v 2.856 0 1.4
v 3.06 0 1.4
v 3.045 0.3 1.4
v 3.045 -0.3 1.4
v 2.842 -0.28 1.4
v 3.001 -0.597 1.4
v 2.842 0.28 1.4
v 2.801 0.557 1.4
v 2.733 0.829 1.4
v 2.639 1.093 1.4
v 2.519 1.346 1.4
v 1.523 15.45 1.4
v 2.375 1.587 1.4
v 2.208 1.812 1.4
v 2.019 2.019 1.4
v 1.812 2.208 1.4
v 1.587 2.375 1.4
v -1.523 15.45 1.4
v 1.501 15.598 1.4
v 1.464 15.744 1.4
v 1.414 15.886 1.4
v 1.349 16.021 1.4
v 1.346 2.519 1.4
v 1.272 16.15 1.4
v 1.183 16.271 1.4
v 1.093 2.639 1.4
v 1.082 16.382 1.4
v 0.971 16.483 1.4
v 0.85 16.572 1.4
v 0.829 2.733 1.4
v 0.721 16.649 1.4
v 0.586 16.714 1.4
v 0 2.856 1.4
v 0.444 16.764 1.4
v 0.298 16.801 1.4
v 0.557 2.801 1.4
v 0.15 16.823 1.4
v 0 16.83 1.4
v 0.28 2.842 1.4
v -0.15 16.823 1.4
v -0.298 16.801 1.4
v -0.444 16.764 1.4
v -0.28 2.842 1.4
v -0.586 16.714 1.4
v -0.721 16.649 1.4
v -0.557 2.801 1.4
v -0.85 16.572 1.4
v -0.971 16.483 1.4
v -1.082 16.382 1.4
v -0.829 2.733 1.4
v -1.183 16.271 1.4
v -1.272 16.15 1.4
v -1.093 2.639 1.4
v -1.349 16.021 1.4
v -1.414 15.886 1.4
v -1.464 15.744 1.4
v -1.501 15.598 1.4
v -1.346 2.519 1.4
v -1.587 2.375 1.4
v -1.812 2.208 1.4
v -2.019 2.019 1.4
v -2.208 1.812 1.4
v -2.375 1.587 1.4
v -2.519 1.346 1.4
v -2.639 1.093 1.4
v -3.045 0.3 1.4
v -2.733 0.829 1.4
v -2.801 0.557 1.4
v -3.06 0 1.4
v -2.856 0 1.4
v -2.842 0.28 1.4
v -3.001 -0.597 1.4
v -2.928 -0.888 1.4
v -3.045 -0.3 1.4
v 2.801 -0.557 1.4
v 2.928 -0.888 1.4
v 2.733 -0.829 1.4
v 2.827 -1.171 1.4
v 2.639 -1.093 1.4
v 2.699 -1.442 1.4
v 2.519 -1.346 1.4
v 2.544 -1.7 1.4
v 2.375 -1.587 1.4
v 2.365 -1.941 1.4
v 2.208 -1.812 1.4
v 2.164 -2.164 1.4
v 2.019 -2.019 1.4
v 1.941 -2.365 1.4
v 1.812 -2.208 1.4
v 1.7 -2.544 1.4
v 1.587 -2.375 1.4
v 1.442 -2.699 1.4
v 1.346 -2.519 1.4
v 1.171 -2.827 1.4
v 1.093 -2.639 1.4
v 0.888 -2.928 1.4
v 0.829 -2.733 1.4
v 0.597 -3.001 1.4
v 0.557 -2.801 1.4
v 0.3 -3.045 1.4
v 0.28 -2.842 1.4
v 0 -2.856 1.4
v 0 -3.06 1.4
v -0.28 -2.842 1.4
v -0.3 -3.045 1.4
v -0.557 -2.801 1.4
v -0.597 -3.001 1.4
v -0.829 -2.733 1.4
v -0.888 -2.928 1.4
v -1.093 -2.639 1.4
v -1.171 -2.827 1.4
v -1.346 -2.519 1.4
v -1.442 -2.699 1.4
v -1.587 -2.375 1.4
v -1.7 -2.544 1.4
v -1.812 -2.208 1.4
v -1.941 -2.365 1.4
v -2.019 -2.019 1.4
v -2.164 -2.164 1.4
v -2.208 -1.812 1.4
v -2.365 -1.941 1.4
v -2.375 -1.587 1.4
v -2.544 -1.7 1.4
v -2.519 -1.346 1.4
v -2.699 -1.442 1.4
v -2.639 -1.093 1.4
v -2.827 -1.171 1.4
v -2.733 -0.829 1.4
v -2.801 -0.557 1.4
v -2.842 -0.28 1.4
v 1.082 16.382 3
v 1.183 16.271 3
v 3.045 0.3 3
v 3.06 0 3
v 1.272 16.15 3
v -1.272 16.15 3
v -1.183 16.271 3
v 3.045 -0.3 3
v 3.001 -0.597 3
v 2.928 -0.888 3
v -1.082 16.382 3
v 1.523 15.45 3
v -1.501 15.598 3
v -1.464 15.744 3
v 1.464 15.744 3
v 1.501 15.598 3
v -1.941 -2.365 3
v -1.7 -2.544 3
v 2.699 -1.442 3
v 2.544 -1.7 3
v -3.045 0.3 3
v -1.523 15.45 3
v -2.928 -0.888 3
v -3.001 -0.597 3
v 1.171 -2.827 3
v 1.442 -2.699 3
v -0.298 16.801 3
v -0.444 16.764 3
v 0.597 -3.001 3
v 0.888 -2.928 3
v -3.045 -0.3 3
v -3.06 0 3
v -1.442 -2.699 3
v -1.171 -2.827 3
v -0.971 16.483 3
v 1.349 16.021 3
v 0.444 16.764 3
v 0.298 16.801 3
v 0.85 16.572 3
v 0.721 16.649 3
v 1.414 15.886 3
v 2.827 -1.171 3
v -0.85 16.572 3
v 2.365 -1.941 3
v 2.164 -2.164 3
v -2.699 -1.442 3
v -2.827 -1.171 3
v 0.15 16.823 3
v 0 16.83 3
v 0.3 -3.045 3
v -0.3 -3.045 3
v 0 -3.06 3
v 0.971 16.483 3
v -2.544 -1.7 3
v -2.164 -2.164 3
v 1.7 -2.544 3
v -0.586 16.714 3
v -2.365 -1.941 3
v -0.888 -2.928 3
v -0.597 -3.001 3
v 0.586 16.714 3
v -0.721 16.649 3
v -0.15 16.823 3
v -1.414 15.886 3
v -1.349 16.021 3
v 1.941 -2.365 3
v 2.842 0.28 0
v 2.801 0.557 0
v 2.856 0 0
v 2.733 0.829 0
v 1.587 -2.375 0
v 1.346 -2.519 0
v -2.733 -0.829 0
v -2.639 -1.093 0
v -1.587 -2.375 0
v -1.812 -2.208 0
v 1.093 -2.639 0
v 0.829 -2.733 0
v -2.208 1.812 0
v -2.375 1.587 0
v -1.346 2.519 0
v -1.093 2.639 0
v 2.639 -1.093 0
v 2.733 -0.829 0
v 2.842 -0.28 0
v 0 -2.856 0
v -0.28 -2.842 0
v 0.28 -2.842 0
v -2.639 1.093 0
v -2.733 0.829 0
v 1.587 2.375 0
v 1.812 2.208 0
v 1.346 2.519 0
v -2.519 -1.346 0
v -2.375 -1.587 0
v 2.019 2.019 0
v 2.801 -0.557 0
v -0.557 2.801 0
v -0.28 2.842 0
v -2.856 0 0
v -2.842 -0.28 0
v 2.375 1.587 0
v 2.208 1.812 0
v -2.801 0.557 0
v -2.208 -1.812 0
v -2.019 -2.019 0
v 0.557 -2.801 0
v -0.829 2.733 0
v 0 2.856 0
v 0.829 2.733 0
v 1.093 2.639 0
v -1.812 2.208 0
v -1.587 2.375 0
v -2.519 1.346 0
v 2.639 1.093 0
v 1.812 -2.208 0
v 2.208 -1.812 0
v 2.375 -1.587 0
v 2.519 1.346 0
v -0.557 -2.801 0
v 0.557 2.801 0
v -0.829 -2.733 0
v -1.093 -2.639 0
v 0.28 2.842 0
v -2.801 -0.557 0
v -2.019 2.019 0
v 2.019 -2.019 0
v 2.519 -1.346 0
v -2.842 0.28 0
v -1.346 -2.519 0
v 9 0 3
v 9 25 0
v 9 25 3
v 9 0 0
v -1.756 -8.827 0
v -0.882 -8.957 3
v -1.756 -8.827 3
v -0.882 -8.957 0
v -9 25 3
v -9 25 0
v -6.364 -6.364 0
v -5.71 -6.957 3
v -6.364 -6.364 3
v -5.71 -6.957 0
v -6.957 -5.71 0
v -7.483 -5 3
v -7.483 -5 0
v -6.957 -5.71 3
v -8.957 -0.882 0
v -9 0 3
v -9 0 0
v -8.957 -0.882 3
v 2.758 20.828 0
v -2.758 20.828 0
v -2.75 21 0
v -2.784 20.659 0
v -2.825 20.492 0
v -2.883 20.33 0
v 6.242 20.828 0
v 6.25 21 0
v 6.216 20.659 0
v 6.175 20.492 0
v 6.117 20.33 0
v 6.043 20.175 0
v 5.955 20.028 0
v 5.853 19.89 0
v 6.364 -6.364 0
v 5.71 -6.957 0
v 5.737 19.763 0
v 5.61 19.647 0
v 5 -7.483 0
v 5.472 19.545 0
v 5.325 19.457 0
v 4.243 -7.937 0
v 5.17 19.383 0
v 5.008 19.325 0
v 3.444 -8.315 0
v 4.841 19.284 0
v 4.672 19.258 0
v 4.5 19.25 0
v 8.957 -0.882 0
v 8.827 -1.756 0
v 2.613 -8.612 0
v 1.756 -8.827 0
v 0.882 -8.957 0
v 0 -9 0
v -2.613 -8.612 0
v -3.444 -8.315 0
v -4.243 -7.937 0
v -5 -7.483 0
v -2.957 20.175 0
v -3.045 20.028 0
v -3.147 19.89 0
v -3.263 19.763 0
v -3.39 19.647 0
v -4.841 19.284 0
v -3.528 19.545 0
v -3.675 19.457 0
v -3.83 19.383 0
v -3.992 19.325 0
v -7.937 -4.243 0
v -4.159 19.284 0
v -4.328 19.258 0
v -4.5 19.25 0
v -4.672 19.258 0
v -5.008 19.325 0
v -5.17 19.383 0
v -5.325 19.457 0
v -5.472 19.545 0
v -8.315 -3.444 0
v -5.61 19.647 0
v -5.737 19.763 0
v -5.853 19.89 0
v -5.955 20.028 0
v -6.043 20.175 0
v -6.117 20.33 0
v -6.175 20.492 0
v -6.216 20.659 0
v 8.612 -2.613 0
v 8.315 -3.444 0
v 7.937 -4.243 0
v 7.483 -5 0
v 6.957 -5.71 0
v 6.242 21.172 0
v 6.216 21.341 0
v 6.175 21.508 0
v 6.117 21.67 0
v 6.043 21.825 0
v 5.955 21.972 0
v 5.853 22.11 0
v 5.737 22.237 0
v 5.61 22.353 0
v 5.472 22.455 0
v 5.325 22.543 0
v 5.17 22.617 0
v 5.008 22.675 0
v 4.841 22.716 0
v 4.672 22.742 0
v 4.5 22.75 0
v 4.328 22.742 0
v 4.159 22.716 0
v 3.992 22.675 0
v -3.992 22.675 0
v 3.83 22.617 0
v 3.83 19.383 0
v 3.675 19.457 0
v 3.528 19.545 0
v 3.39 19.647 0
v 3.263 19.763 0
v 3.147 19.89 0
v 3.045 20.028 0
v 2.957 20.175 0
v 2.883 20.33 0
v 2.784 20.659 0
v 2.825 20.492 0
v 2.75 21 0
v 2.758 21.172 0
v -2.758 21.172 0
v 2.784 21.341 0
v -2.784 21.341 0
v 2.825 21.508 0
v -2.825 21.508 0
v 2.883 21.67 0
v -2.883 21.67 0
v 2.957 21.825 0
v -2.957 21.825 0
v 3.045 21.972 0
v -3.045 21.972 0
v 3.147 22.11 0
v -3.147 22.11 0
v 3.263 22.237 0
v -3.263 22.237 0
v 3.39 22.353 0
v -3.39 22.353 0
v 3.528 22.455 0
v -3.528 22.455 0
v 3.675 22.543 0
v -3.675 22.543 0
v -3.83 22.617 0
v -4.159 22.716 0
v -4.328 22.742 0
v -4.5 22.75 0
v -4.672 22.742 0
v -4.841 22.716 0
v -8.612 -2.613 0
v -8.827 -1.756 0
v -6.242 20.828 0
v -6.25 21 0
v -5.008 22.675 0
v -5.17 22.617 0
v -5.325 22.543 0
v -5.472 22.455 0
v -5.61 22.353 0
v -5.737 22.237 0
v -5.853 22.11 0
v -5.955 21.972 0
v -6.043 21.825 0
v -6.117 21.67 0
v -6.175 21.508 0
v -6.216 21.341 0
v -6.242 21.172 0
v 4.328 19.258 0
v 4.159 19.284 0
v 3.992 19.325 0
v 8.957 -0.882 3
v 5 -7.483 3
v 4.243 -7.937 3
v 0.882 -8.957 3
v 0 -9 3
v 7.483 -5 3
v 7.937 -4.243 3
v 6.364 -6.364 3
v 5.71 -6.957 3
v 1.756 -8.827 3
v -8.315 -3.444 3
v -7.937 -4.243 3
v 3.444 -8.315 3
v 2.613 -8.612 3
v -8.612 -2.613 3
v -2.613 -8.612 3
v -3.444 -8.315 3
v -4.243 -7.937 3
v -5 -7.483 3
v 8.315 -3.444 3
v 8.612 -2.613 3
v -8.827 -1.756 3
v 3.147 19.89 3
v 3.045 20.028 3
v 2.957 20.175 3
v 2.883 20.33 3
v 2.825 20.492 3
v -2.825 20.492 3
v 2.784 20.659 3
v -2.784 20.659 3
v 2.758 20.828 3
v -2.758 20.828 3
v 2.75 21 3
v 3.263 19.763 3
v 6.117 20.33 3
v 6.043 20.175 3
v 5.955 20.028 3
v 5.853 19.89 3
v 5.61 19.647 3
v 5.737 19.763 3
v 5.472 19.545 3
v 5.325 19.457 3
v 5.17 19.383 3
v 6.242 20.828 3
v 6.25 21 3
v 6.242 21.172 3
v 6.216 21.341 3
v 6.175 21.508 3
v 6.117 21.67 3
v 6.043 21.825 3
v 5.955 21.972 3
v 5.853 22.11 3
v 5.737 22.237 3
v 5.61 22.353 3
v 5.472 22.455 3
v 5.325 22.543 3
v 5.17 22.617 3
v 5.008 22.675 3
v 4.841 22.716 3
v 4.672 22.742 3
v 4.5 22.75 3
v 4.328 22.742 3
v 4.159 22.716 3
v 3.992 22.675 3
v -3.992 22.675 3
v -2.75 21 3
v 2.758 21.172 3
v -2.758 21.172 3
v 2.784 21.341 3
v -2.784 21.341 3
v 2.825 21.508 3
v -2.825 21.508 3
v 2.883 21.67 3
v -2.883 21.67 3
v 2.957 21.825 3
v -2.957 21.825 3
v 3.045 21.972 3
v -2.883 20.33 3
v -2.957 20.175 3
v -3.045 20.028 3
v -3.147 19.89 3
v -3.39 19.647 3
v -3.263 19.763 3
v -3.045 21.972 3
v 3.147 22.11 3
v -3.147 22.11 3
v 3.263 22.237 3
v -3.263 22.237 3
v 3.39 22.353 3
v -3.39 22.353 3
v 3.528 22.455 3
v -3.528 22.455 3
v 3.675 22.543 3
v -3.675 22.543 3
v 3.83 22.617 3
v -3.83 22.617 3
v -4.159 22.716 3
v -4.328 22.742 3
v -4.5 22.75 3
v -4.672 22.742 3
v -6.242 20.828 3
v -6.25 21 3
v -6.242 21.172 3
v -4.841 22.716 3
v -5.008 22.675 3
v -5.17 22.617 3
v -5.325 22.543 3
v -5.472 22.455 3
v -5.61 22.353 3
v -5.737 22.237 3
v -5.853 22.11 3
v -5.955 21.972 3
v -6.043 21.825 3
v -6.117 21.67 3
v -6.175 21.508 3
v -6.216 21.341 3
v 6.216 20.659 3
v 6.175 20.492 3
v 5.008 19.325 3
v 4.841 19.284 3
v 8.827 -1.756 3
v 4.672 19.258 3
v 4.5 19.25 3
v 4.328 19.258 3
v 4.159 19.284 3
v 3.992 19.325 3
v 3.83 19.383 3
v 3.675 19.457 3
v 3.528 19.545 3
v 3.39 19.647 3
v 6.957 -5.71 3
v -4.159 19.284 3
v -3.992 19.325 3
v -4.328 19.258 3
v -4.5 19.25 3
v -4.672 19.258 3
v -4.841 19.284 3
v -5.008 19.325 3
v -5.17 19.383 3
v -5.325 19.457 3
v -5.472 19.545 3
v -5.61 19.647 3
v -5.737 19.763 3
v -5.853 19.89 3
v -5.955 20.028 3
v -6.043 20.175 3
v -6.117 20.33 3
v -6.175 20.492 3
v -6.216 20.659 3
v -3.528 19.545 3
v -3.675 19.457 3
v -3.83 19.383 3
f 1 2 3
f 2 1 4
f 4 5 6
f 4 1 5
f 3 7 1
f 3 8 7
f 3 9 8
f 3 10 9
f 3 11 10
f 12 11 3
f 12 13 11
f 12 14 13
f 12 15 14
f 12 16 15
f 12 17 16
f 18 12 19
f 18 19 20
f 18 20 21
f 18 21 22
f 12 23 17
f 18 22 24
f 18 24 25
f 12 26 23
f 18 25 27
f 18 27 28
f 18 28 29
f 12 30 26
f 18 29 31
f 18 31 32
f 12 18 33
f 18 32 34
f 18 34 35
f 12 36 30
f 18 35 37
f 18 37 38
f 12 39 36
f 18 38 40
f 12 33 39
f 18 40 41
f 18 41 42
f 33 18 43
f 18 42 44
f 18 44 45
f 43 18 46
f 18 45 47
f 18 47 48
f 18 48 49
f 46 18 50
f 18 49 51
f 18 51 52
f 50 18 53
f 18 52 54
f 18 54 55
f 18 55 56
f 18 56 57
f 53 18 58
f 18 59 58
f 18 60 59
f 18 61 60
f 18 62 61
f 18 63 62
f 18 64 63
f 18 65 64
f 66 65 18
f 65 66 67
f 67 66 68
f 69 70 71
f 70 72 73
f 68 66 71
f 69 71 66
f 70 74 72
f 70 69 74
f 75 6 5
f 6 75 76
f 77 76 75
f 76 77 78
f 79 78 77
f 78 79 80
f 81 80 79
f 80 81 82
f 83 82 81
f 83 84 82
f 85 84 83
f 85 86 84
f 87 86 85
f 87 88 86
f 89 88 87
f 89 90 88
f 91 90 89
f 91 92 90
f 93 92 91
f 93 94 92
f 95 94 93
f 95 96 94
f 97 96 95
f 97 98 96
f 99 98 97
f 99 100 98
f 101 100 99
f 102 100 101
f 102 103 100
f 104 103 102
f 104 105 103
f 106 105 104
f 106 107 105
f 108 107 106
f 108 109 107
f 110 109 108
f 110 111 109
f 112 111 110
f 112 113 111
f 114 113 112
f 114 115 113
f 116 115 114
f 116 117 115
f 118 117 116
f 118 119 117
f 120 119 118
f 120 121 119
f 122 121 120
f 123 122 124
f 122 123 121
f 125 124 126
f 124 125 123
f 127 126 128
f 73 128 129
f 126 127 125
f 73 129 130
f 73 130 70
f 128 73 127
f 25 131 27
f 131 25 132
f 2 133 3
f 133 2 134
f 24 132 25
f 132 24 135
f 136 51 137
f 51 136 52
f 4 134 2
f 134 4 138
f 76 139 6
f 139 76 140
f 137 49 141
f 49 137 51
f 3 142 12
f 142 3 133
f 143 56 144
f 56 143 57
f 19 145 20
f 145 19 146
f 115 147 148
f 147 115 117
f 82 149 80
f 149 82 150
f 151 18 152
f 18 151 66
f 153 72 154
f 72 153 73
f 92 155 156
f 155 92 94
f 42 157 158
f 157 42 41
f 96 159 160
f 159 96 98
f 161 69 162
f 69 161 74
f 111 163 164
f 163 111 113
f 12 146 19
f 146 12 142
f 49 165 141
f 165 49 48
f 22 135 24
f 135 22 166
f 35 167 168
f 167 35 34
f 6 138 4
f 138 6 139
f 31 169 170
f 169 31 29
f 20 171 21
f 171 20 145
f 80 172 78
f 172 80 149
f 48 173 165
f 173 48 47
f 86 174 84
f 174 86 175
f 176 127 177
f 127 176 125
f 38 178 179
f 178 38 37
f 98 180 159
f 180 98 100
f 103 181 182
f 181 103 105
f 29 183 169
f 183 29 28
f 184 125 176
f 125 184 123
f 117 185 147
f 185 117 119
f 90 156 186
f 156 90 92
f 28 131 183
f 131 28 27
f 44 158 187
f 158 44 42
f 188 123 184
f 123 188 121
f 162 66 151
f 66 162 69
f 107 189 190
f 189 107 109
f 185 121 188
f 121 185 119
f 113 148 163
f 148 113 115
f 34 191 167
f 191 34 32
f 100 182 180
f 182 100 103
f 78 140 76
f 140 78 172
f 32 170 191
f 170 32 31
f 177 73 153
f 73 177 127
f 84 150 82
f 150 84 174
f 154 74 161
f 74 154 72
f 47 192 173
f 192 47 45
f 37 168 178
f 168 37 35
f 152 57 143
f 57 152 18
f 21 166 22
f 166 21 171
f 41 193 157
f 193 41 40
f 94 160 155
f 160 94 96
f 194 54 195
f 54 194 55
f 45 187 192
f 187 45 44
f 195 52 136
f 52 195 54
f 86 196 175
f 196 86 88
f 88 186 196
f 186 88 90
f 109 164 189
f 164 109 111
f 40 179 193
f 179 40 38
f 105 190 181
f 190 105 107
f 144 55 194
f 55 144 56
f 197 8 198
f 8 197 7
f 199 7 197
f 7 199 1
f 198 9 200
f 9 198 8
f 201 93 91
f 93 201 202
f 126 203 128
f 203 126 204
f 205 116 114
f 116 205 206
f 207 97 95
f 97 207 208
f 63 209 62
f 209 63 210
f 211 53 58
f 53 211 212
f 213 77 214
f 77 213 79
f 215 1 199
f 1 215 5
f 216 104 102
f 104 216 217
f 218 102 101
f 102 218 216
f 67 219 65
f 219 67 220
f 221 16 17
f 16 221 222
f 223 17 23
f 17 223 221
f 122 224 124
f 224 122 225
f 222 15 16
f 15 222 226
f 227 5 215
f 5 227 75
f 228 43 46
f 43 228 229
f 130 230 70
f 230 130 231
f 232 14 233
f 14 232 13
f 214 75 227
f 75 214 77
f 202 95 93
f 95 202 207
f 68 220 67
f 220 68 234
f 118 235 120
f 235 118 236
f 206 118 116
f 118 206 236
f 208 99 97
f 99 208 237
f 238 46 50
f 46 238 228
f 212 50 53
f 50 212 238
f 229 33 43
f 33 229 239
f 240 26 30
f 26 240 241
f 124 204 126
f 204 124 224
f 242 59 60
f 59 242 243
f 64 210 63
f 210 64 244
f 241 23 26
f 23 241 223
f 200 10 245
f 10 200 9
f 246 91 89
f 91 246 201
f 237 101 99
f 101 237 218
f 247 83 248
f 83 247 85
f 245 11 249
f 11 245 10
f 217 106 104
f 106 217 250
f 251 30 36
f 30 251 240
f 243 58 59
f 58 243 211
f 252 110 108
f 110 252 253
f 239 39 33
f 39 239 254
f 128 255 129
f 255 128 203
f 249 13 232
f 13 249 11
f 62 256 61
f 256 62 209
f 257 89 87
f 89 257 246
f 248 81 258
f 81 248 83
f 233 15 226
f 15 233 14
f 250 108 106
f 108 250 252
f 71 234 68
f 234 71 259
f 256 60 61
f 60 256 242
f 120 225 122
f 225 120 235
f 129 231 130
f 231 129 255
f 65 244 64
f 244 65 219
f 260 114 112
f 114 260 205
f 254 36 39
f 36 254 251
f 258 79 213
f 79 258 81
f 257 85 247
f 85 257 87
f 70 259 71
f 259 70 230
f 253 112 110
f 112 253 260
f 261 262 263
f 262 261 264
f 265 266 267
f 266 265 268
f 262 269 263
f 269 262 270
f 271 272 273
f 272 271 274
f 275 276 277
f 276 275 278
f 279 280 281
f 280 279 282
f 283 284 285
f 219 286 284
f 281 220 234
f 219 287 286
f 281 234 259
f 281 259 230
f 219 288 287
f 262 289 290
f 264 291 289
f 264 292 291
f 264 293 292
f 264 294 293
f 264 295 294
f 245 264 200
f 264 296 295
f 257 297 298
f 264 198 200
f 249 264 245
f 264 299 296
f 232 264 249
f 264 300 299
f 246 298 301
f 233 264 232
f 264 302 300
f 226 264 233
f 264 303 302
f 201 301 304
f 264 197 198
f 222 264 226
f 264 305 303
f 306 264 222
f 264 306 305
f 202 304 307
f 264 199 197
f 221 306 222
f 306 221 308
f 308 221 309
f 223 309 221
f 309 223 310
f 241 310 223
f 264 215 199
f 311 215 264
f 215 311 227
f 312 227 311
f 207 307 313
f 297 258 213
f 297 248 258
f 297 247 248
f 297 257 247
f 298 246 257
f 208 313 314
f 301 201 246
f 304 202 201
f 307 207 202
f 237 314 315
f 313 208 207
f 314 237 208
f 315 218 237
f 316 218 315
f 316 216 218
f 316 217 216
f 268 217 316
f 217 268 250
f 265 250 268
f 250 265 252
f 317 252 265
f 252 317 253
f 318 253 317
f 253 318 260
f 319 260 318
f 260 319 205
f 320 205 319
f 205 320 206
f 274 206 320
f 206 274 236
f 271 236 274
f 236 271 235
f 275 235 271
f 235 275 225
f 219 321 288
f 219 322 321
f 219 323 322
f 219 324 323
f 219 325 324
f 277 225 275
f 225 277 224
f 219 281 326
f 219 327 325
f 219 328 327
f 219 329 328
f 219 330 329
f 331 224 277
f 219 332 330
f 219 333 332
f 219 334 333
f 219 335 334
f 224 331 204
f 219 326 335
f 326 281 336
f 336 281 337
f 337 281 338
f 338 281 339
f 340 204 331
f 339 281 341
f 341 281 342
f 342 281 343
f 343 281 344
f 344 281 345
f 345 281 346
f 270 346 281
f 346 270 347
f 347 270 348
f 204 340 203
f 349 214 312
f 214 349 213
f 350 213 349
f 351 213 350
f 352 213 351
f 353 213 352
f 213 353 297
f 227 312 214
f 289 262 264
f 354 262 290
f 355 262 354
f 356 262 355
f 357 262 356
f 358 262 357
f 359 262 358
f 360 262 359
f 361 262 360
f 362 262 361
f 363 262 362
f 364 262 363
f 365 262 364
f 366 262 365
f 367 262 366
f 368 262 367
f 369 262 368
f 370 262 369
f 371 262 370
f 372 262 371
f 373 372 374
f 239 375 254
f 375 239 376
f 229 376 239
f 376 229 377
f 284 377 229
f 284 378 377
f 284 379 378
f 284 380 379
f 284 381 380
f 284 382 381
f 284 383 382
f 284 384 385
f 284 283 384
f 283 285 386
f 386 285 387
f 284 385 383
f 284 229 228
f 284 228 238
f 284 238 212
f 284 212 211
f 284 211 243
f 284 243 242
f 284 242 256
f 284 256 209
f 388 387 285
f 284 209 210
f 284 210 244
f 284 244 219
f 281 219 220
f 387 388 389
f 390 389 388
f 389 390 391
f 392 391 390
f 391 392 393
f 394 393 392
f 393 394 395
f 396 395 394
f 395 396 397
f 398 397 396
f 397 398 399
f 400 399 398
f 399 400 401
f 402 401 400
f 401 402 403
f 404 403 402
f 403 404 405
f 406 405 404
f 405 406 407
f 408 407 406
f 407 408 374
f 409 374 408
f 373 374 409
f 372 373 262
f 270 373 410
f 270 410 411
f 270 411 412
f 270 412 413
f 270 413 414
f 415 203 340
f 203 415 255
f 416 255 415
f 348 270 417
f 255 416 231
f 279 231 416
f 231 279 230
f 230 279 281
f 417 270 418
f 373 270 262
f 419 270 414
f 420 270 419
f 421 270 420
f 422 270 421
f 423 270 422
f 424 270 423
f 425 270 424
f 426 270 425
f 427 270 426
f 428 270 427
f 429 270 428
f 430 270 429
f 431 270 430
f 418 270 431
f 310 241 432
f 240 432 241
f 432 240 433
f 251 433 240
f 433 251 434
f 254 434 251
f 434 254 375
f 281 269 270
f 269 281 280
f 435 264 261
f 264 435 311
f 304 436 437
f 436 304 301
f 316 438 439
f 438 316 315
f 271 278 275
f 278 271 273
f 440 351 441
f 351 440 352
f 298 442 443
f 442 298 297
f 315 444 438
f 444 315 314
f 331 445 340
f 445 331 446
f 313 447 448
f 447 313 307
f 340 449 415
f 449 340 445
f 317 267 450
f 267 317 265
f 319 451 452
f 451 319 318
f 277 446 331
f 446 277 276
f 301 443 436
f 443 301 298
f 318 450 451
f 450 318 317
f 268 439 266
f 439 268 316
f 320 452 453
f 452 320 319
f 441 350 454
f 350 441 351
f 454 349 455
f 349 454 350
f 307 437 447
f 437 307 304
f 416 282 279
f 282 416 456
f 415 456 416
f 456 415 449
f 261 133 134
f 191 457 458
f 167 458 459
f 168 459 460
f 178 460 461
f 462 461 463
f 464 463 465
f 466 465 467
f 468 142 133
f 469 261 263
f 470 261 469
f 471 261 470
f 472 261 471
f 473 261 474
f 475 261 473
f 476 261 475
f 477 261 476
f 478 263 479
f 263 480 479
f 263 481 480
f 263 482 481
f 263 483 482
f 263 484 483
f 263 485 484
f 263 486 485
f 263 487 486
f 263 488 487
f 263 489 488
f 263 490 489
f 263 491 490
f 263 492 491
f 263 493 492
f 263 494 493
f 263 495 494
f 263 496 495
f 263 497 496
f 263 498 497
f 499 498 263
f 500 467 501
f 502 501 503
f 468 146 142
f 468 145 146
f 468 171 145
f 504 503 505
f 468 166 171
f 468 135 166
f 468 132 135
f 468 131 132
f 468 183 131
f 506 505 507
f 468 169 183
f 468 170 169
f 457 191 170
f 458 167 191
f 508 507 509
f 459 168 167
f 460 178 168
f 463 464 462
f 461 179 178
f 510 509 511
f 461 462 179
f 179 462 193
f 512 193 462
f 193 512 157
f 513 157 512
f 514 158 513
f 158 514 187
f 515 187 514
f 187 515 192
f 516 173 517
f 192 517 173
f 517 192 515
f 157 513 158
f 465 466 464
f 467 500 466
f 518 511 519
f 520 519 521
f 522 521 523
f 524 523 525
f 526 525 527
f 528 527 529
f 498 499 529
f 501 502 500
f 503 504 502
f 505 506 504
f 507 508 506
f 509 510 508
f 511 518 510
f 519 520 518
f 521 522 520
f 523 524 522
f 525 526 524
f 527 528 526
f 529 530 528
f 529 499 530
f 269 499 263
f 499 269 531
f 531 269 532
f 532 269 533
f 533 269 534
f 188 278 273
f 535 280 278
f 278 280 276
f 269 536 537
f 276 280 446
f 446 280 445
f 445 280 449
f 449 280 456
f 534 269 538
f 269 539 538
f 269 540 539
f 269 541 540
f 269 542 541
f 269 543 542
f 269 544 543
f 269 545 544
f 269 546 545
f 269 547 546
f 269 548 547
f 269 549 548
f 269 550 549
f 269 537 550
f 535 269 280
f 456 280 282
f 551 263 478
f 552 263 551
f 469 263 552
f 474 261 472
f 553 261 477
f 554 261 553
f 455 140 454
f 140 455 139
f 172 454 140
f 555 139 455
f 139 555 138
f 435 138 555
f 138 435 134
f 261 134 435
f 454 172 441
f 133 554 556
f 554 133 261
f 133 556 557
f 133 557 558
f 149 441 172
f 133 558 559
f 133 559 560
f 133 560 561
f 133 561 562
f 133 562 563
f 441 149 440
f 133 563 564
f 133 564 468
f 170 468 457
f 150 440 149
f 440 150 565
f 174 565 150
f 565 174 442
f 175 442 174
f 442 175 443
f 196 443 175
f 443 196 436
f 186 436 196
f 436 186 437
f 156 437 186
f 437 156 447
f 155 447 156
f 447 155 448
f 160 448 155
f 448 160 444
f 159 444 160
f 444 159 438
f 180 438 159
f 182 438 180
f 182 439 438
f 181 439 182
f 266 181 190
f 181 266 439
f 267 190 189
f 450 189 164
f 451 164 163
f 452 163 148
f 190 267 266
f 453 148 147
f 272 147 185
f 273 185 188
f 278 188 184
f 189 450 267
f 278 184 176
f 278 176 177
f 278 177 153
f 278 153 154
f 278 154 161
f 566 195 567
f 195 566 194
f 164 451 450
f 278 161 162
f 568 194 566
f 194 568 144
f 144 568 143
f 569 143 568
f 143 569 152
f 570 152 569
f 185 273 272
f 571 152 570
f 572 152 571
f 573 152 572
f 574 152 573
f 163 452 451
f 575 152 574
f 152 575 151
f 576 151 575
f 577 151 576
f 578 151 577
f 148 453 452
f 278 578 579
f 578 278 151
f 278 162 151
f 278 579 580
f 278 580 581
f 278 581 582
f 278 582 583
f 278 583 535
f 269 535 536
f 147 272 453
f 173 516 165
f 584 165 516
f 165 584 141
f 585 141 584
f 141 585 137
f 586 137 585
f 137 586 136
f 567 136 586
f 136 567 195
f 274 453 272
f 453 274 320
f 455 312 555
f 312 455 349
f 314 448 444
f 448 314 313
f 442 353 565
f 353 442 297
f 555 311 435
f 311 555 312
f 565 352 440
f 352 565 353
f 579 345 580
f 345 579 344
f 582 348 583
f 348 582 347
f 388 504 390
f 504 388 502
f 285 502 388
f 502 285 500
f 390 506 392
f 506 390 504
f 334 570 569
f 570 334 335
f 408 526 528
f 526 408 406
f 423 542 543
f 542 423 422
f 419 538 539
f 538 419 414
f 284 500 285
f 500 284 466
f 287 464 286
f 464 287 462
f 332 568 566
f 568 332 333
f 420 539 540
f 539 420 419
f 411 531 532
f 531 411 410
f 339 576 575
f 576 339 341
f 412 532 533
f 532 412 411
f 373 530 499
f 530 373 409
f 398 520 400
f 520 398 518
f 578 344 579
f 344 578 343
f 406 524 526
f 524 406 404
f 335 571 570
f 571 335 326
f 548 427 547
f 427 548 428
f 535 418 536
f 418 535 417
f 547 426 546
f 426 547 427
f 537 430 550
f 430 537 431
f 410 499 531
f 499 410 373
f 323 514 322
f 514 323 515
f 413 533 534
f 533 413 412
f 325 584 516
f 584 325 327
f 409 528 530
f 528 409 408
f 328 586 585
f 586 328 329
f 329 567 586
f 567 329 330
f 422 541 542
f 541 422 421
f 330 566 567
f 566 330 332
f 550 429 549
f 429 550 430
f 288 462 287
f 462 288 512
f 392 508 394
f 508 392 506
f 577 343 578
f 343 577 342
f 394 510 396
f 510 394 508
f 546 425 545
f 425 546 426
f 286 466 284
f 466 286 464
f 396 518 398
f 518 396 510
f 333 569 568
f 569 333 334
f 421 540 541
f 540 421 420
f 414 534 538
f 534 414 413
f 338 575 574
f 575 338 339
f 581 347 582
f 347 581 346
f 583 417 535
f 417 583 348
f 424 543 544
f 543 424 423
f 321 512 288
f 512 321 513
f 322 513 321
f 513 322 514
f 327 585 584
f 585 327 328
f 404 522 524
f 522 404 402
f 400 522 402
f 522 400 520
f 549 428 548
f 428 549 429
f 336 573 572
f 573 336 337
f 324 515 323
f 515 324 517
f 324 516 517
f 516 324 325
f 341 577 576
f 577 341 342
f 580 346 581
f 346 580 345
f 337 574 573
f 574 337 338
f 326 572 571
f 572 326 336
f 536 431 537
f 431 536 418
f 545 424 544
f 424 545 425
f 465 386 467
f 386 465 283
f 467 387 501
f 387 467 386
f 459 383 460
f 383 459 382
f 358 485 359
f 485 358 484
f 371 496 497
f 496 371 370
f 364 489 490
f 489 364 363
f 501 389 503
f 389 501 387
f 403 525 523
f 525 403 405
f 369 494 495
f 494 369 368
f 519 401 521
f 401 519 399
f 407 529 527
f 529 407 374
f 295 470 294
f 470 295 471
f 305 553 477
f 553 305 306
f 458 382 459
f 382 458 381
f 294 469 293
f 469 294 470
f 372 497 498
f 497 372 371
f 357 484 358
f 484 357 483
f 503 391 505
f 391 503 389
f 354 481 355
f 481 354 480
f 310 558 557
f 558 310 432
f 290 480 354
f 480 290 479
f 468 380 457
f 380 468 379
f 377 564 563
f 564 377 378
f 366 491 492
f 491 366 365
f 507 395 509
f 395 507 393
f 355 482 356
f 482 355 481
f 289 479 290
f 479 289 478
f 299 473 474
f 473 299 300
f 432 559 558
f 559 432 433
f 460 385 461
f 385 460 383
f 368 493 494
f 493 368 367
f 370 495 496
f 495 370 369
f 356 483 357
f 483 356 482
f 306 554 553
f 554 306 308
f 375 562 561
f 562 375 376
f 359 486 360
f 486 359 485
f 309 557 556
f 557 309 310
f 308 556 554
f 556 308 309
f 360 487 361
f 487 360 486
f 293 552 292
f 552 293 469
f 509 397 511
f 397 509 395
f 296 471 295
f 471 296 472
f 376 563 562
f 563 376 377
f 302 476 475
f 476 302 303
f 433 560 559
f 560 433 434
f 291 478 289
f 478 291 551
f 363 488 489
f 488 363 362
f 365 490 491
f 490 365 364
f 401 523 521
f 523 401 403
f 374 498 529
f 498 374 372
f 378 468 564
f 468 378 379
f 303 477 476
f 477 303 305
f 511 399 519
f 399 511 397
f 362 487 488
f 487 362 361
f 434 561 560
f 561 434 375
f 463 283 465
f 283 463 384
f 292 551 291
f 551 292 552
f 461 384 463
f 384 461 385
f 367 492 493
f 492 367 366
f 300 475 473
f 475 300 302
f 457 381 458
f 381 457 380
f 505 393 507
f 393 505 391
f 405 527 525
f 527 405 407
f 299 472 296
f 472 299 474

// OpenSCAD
// file: ../envelopes/servo-arm-envelope.scad
servoArmEnvelope();

module servoArmEnvelope(hole_h = 7, arm_h = 2) {
    union() {
        translate([0, 0, 0])
        hull() {
            cylinder(h = arm_h, r = 3, center = false, $fn = 64);

            translate([0, 15.0, 0])
                cylinder(h = arm_h, r = 1.5, center = false, $fn = 64);
        }
        cylinder(h = hole_h, r = 2.8, center = true, $fn = 64);
    }
}
// main file
use <../envelopes/servo-arm-envelope.scad>

hipSupportPieceA();

/**
 * hipSupportPieceA
 * @name hipSupportPieceA
 * @description Holds the hip component
 * @type piece
 * @parent LegHipComponent
 * @stl
 */
module hipSupportPieceA(
    length = 25,
    width = 18
) {
    thickness = 3;

    screw_hole_diameter = 3.5;

    difference() {
        hull() {
            cylinder(h = thickness, r = width / 2, center = false, $fn = 64);
            
            translate([0, length - 1, thickness / 2])
                cube([width, 2, thickness], center = true);
        }

        translate([0, 0, 1.4])
            // scaling to prevent same size object
            scale([1.02, 1.02, 1])
                servoArmEnvelope(hole_h = 10, arm_h = 3);

        // Screw holes
        translate([-4.5, length - 4, 0])
            cylinder(h = thickness * 5, r = screw_hole_diameter / 2, center = true, $fn = 64);

        translate([4.5, length - 4, 0])
            cylinder(h = thickness * 5, r = screw_hole_diameter / 2, center = true, $fn = 64);
    }
}

/**
 * @stl
 * @png
 * @colorscheme BeforeDawn
 * @view axes,scales
 */
hipSupportPieceA();
